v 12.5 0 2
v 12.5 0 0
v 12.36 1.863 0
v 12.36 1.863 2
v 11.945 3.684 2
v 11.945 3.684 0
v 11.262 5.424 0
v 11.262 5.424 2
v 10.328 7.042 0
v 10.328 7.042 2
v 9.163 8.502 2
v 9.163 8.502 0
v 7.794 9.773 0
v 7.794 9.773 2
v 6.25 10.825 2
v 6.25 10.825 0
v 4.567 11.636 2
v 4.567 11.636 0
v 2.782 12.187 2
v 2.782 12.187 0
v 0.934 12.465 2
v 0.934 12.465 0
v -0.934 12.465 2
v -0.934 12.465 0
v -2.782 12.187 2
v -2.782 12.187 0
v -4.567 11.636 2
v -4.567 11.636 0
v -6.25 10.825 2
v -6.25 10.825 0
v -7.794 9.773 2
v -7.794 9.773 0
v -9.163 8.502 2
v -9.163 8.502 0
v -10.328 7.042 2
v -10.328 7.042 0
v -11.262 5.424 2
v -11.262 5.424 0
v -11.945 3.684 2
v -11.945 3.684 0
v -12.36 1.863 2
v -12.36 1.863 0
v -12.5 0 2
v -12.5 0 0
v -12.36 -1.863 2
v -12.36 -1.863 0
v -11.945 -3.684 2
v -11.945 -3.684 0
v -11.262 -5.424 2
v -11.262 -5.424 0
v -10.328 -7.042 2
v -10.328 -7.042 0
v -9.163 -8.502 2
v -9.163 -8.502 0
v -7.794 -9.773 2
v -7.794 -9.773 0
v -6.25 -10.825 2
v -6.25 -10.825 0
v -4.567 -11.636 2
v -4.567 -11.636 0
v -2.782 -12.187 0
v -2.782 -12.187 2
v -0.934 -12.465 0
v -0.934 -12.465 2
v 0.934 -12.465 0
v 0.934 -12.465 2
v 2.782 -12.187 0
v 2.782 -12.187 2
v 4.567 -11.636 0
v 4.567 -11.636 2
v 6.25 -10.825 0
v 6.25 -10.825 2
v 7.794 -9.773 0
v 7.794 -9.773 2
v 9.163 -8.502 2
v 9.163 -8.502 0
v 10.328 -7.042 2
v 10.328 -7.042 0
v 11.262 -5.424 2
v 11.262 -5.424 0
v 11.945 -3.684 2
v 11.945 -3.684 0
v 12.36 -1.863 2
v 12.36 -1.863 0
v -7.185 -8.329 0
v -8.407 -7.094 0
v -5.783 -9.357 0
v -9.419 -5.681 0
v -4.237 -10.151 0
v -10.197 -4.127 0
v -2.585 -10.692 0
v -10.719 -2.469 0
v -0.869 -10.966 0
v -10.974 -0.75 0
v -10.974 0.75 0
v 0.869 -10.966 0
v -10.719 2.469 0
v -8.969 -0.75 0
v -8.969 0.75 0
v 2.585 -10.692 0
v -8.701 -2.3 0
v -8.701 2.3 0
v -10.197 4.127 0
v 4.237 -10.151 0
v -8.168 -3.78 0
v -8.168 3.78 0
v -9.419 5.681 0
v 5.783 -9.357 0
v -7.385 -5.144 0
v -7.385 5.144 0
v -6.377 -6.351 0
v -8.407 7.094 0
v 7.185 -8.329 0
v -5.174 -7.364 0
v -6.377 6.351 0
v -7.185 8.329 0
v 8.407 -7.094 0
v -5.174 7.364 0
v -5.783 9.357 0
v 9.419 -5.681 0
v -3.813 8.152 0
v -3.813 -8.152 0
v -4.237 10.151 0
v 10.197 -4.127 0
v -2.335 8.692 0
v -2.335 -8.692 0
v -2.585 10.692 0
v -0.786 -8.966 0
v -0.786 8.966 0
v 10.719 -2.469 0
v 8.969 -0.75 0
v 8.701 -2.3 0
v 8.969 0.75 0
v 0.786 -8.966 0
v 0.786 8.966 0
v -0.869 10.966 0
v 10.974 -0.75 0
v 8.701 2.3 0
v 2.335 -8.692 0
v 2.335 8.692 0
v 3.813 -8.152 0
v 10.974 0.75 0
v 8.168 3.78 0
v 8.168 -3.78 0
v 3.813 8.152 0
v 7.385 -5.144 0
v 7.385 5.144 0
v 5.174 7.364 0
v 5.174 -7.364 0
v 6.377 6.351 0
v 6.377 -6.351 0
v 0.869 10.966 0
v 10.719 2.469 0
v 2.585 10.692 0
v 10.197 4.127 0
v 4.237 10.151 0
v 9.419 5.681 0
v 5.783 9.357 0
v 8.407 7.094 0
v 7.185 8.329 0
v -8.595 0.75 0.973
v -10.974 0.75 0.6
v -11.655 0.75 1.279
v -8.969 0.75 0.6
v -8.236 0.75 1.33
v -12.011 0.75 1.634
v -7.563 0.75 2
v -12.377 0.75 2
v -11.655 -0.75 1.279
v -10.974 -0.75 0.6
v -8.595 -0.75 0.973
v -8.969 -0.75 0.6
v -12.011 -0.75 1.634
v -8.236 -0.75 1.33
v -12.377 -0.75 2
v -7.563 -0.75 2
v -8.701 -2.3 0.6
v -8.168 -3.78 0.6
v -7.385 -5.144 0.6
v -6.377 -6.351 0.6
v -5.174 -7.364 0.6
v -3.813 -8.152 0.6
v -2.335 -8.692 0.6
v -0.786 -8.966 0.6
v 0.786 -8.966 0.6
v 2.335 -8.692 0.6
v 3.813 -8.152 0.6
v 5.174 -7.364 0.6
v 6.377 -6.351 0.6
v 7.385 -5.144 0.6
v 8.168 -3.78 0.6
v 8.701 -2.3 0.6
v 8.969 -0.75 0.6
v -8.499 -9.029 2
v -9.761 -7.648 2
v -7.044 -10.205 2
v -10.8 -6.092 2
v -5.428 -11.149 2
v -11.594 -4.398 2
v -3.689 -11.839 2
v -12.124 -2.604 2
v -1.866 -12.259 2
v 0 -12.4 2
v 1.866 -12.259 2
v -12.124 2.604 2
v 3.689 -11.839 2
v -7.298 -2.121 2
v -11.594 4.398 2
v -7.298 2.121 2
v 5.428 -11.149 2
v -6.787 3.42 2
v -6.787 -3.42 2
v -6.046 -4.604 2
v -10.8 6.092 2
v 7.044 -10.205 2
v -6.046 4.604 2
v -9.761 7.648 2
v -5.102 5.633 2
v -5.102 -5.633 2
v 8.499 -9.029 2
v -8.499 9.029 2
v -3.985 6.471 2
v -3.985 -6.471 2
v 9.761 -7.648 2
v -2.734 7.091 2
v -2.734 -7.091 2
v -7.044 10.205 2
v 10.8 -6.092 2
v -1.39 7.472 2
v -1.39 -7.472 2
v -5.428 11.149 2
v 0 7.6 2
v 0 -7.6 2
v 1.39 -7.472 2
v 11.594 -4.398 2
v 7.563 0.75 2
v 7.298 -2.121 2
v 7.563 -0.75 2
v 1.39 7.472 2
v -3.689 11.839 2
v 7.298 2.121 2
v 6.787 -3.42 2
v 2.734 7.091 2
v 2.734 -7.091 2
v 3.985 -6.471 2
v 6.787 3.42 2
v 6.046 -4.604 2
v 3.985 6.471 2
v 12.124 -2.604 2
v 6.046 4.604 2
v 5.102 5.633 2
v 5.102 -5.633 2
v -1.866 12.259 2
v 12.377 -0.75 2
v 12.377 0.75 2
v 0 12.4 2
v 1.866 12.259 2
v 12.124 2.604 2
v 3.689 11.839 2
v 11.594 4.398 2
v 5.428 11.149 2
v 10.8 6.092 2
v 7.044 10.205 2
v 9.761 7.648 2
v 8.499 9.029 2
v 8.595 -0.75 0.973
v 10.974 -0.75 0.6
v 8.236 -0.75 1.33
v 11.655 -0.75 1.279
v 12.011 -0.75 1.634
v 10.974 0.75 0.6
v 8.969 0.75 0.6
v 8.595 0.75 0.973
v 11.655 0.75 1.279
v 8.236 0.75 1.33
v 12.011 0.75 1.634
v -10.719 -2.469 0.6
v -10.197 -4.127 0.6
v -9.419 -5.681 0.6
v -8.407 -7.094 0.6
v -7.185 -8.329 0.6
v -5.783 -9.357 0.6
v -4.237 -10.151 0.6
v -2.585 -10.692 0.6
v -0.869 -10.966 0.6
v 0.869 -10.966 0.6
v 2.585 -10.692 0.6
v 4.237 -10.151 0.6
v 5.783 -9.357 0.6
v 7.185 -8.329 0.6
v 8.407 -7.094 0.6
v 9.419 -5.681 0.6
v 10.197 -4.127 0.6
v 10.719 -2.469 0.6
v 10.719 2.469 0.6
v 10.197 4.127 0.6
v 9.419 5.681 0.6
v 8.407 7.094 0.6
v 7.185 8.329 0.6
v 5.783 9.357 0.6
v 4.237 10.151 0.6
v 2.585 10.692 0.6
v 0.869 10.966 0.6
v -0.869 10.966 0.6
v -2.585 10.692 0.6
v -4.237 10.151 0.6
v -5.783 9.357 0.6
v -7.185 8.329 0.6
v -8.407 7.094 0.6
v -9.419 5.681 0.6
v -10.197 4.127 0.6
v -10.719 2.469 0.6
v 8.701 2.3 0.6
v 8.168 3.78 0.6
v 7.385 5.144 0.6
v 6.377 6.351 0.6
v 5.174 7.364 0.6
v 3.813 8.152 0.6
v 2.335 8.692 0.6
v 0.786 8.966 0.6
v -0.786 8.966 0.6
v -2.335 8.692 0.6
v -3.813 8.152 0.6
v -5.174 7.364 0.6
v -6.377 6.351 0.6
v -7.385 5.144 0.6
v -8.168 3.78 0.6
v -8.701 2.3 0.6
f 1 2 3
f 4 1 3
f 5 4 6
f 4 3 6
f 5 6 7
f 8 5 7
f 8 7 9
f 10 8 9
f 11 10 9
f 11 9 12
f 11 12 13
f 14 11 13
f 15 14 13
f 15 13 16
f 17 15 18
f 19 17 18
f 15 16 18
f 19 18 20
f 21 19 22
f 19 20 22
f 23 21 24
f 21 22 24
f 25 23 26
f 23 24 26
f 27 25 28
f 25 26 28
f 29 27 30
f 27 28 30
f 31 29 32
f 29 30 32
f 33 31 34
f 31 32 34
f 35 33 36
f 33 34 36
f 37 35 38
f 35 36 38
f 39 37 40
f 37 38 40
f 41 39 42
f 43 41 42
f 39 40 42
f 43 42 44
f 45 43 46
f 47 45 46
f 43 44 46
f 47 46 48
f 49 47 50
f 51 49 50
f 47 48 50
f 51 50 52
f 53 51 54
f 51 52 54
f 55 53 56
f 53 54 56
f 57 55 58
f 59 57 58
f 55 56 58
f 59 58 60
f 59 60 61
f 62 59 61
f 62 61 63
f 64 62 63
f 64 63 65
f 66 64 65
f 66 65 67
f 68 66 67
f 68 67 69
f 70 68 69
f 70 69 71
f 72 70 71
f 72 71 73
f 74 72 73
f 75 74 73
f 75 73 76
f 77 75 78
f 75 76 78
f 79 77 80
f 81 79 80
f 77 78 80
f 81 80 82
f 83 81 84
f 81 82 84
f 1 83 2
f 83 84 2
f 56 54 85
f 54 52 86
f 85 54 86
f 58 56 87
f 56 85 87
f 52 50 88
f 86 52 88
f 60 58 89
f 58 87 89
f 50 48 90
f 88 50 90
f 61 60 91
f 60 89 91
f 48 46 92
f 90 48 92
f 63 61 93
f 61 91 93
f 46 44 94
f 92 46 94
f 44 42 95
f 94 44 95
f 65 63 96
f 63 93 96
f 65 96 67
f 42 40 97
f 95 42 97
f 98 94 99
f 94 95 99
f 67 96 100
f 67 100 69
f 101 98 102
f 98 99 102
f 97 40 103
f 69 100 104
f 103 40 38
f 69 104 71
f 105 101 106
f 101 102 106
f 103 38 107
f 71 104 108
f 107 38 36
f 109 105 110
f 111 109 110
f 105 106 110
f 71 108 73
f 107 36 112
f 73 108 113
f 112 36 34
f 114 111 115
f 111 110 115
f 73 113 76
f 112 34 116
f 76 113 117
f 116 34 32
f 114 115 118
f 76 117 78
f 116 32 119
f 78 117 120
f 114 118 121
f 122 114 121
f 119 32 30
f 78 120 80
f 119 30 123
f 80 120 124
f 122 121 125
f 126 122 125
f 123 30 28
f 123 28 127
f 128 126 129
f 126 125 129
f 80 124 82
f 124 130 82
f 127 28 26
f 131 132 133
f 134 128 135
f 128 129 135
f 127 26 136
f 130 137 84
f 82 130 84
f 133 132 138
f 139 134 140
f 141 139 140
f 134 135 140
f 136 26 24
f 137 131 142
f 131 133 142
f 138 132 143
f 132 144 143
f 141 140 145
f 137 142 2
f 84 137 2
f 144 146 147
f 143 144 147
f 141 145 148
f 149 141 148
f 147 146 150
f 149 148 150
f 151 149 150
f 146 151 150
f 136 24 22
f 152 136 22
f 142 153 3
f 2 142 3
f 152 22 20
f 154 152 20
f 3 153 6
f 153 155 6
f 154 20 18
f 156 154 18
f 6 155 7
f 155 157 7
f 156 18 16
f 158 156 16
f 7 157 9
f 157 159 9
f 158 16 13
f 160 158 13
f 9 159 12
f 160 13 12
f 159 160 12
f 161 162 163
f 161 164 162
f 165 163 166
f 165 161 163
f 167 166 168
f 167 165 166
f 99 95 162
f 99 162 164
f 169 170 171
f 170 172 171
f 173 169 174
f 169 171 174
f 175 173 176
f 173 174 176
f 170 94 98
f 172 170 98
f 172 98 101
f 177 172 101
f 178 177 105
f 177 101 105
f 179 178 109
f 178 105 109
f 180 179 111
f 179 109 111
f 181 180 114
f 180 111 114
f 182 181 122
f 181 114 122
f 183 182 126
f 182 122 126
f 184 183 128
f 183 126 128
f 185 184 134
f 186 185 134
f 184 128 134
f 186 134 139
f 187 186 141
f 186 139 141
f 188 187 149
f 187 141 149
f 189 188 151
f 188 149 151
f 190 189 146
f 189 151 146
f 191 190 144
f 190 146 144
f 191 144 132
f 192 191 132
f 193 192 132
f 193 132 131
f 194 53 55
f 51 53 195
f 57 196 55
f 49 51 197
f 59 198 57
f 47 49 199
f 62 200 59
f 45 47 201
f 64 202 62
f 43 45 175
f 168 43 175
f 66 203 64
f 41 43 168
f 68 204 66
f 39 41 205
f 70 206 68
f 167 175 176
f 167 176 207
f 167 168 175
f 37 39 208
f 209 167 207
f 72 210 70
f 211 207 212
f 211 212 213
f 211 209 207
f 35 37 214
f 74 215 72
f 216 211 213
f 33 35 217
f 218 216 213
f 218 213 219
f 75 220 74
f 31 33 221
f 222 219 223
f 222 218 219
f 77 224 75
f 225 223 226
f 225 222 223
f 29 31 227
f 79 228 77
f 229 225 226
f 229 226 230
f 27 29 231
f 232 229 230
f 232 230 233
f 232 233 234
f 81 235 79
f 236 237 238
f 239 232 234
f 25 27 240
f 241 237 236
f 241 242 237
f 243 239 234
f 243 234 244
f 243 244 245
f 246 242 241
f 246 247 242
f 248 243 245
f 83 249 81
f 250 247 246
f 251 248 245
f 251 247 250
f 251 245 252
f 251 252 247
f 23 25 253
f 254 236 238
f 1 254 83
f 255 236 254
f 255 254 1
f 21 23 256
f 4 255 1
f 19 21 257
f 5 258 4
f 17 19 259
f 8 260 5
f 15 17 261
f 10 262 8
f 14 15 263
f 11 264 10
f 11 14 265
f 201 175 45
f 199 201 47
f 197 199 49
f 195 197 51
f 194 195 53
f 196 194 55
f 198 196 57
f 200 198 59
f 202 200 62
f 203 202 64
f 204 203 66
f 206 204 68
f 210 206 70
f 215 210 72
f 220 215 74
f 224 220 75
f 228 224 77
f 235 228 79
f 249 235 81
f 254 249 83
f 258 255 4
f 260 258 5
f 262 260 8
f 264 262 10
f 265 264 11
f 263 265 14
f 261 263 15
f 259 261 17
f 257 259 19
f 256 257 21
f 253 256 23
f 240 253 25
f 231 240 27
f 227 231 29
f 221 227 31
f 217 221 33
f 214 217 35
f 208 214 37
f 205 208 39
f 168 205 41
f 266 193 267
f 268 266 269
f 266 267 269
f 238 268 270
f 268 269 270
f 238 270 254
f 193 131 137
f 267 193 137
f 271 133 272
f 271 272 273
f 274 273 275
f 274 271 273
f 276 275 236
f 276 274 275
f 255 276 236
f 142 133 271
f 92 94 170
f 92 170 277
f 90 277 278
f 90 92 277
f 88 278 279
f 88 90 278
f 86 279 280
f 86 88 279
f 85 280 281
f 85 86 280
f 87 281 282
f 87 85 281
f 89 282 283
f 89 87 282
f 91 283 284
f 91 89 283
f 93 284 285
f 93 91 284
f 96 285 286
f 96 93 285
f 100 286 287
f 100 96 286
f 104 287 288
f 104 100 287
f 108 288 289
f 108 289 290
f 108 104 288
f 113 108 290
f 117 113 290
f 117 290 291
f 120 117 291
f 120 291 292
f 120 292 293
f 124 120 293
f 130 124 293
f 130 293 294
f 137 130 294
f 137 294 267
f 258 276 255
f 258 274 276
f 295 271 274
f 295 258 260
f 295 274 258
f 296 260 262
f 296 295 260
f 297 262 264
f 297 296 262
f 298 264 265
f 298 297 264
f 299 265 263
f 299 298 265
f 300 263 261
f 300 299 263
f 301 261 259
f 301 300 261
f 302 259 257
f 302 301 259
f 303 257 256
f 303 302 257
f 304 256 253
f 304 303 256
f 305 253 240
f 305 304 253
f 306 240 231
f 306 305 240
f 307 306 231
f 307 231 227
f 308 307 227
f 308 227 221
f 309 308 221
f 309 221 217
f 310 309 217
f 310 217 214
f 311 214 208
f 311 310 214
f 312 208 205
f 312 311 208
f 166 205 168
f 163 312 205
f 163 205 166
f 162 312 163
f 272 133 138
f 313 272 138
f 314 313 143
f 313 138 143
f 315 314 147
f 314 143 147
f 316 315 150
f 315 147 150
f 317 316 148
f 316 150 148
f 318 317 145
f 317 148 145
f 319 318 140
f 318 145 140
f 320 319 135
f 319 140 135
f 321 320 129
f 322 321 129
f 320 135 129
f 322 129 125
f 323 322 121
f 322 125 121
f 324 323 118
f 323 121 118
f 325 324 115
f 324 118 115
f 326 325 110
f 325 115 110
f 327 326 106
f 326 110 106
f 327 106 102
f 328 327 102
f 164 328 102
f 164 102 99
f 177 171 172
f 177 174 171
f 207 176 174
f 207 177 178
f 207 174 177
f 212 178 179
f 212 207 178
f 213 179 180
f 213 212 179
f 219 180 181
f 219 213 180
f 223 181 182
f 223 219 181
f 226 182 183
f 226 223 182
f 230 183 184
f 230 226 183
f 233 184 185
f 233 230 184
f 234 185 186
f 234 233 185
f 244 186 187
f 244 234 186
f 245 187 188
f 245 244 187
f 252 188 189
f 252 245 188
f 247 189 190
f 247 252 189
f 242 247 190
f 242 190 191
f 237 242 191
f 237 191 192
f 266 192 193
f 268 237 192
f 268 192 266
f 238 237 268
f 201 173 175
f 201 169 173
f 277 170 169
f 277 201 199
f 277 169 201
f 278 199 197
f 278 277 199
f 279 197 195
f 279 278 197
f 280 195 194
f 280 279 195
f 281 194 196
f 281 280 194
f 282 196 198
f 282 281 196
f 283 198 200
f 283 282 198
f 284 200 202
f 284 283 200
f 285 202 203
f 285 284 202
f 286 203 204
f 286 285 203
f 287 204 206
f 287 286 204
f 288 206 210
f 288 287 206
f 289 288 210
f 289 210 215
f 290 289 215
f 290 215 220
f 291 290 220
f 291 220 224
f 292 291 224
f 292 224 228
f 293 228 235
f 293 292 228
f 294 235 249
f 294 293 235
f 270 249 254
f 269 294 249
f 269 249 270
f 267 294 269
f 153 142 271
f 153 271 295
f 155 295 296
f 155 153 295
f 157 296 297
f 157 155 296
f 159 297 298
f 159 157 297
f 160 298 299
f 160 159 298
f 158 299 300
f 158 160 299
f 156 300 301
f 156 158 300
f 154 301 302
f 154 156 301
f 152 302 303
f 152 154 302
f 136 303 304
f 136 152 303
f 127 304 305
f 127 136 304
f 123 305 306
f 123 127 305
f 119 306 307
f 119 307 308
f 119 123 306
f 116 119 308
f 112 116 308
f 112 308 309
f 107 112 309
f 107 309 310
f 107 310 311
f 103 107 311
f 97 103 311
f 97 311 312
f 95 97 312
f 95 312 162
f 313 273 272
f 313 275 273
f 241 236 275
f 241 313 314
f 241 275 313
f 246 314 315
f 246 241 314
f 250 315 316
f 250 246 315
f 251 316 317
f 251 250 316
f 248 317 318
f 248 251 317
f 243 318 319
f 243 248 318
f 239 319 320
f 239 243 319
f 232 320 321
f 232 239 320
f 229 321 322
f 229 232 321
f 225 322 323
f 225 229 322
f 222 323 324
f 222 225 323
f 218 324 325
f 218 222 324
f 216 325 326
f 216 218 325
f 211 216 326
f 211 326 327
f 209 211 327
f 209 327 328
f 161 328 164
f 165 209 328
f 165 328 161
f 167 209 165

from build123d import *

# Parameters (mm, degrees)
SKETCH_R        = 12.5
PAD_DEPTH       = 2
CHAMFER_SIZE    = 1.4
CHAMFER001_SIZE = 1.4


with BuildPart() as part:
    # Sketch (on XY_Plane of Origin) → Pad (new body)
    with BuildSketch(Plane.XY):
        Circle(SKETCH_R)
        with BuildLine():
            ThreePointArc((-8.968696, -0.75), (0, -9), (8.968696, -0.75))
            Line((8.968696, -0.75), (10.974402, -0.75))
            ThreePointArc((-10.974402, -0.75), (0, -11), (10.974402, -0.75))
            Line((-10.974402, -0.75), (-8.968696, -0.75))
        make_face(mode=Mode.SUBTRACT)
        with BuildLine():
            Line((-10.974402, 0.75), (-8.968696, 0.75))
            ThreePointArc((8.968696, 0.75), (0, 9), (-8.968696, 0.75))
            Line((8.968696, 0.75), (10.974402, 0.75))
            ThreePointArc((10.974402, 0.75), (0, 11), (-10.974402, 0.75))
        make_face(mode=Mode.SUBTRACT)
    extrude(amount=PAD_DEPTH)

    # Chamfer
    chamfer_edges = [part.edges().sort_by_distance(p)[0] for p in [
        (0, -9, 2),
        (0, 9, 2),
    ]]
    chamfer(chamfer_edges, length=CHAMFER_SIZE)

    # Chamfer001
    chamfer001_edges = [part.edges().sort_by_distance(p)[0] for p in [
        (0, -11, 2),
        (0, 11, 2),
    ]]
    chamfer(chamfer001_edges, length=CHAMFER001_SIZE)


solid = part.part
